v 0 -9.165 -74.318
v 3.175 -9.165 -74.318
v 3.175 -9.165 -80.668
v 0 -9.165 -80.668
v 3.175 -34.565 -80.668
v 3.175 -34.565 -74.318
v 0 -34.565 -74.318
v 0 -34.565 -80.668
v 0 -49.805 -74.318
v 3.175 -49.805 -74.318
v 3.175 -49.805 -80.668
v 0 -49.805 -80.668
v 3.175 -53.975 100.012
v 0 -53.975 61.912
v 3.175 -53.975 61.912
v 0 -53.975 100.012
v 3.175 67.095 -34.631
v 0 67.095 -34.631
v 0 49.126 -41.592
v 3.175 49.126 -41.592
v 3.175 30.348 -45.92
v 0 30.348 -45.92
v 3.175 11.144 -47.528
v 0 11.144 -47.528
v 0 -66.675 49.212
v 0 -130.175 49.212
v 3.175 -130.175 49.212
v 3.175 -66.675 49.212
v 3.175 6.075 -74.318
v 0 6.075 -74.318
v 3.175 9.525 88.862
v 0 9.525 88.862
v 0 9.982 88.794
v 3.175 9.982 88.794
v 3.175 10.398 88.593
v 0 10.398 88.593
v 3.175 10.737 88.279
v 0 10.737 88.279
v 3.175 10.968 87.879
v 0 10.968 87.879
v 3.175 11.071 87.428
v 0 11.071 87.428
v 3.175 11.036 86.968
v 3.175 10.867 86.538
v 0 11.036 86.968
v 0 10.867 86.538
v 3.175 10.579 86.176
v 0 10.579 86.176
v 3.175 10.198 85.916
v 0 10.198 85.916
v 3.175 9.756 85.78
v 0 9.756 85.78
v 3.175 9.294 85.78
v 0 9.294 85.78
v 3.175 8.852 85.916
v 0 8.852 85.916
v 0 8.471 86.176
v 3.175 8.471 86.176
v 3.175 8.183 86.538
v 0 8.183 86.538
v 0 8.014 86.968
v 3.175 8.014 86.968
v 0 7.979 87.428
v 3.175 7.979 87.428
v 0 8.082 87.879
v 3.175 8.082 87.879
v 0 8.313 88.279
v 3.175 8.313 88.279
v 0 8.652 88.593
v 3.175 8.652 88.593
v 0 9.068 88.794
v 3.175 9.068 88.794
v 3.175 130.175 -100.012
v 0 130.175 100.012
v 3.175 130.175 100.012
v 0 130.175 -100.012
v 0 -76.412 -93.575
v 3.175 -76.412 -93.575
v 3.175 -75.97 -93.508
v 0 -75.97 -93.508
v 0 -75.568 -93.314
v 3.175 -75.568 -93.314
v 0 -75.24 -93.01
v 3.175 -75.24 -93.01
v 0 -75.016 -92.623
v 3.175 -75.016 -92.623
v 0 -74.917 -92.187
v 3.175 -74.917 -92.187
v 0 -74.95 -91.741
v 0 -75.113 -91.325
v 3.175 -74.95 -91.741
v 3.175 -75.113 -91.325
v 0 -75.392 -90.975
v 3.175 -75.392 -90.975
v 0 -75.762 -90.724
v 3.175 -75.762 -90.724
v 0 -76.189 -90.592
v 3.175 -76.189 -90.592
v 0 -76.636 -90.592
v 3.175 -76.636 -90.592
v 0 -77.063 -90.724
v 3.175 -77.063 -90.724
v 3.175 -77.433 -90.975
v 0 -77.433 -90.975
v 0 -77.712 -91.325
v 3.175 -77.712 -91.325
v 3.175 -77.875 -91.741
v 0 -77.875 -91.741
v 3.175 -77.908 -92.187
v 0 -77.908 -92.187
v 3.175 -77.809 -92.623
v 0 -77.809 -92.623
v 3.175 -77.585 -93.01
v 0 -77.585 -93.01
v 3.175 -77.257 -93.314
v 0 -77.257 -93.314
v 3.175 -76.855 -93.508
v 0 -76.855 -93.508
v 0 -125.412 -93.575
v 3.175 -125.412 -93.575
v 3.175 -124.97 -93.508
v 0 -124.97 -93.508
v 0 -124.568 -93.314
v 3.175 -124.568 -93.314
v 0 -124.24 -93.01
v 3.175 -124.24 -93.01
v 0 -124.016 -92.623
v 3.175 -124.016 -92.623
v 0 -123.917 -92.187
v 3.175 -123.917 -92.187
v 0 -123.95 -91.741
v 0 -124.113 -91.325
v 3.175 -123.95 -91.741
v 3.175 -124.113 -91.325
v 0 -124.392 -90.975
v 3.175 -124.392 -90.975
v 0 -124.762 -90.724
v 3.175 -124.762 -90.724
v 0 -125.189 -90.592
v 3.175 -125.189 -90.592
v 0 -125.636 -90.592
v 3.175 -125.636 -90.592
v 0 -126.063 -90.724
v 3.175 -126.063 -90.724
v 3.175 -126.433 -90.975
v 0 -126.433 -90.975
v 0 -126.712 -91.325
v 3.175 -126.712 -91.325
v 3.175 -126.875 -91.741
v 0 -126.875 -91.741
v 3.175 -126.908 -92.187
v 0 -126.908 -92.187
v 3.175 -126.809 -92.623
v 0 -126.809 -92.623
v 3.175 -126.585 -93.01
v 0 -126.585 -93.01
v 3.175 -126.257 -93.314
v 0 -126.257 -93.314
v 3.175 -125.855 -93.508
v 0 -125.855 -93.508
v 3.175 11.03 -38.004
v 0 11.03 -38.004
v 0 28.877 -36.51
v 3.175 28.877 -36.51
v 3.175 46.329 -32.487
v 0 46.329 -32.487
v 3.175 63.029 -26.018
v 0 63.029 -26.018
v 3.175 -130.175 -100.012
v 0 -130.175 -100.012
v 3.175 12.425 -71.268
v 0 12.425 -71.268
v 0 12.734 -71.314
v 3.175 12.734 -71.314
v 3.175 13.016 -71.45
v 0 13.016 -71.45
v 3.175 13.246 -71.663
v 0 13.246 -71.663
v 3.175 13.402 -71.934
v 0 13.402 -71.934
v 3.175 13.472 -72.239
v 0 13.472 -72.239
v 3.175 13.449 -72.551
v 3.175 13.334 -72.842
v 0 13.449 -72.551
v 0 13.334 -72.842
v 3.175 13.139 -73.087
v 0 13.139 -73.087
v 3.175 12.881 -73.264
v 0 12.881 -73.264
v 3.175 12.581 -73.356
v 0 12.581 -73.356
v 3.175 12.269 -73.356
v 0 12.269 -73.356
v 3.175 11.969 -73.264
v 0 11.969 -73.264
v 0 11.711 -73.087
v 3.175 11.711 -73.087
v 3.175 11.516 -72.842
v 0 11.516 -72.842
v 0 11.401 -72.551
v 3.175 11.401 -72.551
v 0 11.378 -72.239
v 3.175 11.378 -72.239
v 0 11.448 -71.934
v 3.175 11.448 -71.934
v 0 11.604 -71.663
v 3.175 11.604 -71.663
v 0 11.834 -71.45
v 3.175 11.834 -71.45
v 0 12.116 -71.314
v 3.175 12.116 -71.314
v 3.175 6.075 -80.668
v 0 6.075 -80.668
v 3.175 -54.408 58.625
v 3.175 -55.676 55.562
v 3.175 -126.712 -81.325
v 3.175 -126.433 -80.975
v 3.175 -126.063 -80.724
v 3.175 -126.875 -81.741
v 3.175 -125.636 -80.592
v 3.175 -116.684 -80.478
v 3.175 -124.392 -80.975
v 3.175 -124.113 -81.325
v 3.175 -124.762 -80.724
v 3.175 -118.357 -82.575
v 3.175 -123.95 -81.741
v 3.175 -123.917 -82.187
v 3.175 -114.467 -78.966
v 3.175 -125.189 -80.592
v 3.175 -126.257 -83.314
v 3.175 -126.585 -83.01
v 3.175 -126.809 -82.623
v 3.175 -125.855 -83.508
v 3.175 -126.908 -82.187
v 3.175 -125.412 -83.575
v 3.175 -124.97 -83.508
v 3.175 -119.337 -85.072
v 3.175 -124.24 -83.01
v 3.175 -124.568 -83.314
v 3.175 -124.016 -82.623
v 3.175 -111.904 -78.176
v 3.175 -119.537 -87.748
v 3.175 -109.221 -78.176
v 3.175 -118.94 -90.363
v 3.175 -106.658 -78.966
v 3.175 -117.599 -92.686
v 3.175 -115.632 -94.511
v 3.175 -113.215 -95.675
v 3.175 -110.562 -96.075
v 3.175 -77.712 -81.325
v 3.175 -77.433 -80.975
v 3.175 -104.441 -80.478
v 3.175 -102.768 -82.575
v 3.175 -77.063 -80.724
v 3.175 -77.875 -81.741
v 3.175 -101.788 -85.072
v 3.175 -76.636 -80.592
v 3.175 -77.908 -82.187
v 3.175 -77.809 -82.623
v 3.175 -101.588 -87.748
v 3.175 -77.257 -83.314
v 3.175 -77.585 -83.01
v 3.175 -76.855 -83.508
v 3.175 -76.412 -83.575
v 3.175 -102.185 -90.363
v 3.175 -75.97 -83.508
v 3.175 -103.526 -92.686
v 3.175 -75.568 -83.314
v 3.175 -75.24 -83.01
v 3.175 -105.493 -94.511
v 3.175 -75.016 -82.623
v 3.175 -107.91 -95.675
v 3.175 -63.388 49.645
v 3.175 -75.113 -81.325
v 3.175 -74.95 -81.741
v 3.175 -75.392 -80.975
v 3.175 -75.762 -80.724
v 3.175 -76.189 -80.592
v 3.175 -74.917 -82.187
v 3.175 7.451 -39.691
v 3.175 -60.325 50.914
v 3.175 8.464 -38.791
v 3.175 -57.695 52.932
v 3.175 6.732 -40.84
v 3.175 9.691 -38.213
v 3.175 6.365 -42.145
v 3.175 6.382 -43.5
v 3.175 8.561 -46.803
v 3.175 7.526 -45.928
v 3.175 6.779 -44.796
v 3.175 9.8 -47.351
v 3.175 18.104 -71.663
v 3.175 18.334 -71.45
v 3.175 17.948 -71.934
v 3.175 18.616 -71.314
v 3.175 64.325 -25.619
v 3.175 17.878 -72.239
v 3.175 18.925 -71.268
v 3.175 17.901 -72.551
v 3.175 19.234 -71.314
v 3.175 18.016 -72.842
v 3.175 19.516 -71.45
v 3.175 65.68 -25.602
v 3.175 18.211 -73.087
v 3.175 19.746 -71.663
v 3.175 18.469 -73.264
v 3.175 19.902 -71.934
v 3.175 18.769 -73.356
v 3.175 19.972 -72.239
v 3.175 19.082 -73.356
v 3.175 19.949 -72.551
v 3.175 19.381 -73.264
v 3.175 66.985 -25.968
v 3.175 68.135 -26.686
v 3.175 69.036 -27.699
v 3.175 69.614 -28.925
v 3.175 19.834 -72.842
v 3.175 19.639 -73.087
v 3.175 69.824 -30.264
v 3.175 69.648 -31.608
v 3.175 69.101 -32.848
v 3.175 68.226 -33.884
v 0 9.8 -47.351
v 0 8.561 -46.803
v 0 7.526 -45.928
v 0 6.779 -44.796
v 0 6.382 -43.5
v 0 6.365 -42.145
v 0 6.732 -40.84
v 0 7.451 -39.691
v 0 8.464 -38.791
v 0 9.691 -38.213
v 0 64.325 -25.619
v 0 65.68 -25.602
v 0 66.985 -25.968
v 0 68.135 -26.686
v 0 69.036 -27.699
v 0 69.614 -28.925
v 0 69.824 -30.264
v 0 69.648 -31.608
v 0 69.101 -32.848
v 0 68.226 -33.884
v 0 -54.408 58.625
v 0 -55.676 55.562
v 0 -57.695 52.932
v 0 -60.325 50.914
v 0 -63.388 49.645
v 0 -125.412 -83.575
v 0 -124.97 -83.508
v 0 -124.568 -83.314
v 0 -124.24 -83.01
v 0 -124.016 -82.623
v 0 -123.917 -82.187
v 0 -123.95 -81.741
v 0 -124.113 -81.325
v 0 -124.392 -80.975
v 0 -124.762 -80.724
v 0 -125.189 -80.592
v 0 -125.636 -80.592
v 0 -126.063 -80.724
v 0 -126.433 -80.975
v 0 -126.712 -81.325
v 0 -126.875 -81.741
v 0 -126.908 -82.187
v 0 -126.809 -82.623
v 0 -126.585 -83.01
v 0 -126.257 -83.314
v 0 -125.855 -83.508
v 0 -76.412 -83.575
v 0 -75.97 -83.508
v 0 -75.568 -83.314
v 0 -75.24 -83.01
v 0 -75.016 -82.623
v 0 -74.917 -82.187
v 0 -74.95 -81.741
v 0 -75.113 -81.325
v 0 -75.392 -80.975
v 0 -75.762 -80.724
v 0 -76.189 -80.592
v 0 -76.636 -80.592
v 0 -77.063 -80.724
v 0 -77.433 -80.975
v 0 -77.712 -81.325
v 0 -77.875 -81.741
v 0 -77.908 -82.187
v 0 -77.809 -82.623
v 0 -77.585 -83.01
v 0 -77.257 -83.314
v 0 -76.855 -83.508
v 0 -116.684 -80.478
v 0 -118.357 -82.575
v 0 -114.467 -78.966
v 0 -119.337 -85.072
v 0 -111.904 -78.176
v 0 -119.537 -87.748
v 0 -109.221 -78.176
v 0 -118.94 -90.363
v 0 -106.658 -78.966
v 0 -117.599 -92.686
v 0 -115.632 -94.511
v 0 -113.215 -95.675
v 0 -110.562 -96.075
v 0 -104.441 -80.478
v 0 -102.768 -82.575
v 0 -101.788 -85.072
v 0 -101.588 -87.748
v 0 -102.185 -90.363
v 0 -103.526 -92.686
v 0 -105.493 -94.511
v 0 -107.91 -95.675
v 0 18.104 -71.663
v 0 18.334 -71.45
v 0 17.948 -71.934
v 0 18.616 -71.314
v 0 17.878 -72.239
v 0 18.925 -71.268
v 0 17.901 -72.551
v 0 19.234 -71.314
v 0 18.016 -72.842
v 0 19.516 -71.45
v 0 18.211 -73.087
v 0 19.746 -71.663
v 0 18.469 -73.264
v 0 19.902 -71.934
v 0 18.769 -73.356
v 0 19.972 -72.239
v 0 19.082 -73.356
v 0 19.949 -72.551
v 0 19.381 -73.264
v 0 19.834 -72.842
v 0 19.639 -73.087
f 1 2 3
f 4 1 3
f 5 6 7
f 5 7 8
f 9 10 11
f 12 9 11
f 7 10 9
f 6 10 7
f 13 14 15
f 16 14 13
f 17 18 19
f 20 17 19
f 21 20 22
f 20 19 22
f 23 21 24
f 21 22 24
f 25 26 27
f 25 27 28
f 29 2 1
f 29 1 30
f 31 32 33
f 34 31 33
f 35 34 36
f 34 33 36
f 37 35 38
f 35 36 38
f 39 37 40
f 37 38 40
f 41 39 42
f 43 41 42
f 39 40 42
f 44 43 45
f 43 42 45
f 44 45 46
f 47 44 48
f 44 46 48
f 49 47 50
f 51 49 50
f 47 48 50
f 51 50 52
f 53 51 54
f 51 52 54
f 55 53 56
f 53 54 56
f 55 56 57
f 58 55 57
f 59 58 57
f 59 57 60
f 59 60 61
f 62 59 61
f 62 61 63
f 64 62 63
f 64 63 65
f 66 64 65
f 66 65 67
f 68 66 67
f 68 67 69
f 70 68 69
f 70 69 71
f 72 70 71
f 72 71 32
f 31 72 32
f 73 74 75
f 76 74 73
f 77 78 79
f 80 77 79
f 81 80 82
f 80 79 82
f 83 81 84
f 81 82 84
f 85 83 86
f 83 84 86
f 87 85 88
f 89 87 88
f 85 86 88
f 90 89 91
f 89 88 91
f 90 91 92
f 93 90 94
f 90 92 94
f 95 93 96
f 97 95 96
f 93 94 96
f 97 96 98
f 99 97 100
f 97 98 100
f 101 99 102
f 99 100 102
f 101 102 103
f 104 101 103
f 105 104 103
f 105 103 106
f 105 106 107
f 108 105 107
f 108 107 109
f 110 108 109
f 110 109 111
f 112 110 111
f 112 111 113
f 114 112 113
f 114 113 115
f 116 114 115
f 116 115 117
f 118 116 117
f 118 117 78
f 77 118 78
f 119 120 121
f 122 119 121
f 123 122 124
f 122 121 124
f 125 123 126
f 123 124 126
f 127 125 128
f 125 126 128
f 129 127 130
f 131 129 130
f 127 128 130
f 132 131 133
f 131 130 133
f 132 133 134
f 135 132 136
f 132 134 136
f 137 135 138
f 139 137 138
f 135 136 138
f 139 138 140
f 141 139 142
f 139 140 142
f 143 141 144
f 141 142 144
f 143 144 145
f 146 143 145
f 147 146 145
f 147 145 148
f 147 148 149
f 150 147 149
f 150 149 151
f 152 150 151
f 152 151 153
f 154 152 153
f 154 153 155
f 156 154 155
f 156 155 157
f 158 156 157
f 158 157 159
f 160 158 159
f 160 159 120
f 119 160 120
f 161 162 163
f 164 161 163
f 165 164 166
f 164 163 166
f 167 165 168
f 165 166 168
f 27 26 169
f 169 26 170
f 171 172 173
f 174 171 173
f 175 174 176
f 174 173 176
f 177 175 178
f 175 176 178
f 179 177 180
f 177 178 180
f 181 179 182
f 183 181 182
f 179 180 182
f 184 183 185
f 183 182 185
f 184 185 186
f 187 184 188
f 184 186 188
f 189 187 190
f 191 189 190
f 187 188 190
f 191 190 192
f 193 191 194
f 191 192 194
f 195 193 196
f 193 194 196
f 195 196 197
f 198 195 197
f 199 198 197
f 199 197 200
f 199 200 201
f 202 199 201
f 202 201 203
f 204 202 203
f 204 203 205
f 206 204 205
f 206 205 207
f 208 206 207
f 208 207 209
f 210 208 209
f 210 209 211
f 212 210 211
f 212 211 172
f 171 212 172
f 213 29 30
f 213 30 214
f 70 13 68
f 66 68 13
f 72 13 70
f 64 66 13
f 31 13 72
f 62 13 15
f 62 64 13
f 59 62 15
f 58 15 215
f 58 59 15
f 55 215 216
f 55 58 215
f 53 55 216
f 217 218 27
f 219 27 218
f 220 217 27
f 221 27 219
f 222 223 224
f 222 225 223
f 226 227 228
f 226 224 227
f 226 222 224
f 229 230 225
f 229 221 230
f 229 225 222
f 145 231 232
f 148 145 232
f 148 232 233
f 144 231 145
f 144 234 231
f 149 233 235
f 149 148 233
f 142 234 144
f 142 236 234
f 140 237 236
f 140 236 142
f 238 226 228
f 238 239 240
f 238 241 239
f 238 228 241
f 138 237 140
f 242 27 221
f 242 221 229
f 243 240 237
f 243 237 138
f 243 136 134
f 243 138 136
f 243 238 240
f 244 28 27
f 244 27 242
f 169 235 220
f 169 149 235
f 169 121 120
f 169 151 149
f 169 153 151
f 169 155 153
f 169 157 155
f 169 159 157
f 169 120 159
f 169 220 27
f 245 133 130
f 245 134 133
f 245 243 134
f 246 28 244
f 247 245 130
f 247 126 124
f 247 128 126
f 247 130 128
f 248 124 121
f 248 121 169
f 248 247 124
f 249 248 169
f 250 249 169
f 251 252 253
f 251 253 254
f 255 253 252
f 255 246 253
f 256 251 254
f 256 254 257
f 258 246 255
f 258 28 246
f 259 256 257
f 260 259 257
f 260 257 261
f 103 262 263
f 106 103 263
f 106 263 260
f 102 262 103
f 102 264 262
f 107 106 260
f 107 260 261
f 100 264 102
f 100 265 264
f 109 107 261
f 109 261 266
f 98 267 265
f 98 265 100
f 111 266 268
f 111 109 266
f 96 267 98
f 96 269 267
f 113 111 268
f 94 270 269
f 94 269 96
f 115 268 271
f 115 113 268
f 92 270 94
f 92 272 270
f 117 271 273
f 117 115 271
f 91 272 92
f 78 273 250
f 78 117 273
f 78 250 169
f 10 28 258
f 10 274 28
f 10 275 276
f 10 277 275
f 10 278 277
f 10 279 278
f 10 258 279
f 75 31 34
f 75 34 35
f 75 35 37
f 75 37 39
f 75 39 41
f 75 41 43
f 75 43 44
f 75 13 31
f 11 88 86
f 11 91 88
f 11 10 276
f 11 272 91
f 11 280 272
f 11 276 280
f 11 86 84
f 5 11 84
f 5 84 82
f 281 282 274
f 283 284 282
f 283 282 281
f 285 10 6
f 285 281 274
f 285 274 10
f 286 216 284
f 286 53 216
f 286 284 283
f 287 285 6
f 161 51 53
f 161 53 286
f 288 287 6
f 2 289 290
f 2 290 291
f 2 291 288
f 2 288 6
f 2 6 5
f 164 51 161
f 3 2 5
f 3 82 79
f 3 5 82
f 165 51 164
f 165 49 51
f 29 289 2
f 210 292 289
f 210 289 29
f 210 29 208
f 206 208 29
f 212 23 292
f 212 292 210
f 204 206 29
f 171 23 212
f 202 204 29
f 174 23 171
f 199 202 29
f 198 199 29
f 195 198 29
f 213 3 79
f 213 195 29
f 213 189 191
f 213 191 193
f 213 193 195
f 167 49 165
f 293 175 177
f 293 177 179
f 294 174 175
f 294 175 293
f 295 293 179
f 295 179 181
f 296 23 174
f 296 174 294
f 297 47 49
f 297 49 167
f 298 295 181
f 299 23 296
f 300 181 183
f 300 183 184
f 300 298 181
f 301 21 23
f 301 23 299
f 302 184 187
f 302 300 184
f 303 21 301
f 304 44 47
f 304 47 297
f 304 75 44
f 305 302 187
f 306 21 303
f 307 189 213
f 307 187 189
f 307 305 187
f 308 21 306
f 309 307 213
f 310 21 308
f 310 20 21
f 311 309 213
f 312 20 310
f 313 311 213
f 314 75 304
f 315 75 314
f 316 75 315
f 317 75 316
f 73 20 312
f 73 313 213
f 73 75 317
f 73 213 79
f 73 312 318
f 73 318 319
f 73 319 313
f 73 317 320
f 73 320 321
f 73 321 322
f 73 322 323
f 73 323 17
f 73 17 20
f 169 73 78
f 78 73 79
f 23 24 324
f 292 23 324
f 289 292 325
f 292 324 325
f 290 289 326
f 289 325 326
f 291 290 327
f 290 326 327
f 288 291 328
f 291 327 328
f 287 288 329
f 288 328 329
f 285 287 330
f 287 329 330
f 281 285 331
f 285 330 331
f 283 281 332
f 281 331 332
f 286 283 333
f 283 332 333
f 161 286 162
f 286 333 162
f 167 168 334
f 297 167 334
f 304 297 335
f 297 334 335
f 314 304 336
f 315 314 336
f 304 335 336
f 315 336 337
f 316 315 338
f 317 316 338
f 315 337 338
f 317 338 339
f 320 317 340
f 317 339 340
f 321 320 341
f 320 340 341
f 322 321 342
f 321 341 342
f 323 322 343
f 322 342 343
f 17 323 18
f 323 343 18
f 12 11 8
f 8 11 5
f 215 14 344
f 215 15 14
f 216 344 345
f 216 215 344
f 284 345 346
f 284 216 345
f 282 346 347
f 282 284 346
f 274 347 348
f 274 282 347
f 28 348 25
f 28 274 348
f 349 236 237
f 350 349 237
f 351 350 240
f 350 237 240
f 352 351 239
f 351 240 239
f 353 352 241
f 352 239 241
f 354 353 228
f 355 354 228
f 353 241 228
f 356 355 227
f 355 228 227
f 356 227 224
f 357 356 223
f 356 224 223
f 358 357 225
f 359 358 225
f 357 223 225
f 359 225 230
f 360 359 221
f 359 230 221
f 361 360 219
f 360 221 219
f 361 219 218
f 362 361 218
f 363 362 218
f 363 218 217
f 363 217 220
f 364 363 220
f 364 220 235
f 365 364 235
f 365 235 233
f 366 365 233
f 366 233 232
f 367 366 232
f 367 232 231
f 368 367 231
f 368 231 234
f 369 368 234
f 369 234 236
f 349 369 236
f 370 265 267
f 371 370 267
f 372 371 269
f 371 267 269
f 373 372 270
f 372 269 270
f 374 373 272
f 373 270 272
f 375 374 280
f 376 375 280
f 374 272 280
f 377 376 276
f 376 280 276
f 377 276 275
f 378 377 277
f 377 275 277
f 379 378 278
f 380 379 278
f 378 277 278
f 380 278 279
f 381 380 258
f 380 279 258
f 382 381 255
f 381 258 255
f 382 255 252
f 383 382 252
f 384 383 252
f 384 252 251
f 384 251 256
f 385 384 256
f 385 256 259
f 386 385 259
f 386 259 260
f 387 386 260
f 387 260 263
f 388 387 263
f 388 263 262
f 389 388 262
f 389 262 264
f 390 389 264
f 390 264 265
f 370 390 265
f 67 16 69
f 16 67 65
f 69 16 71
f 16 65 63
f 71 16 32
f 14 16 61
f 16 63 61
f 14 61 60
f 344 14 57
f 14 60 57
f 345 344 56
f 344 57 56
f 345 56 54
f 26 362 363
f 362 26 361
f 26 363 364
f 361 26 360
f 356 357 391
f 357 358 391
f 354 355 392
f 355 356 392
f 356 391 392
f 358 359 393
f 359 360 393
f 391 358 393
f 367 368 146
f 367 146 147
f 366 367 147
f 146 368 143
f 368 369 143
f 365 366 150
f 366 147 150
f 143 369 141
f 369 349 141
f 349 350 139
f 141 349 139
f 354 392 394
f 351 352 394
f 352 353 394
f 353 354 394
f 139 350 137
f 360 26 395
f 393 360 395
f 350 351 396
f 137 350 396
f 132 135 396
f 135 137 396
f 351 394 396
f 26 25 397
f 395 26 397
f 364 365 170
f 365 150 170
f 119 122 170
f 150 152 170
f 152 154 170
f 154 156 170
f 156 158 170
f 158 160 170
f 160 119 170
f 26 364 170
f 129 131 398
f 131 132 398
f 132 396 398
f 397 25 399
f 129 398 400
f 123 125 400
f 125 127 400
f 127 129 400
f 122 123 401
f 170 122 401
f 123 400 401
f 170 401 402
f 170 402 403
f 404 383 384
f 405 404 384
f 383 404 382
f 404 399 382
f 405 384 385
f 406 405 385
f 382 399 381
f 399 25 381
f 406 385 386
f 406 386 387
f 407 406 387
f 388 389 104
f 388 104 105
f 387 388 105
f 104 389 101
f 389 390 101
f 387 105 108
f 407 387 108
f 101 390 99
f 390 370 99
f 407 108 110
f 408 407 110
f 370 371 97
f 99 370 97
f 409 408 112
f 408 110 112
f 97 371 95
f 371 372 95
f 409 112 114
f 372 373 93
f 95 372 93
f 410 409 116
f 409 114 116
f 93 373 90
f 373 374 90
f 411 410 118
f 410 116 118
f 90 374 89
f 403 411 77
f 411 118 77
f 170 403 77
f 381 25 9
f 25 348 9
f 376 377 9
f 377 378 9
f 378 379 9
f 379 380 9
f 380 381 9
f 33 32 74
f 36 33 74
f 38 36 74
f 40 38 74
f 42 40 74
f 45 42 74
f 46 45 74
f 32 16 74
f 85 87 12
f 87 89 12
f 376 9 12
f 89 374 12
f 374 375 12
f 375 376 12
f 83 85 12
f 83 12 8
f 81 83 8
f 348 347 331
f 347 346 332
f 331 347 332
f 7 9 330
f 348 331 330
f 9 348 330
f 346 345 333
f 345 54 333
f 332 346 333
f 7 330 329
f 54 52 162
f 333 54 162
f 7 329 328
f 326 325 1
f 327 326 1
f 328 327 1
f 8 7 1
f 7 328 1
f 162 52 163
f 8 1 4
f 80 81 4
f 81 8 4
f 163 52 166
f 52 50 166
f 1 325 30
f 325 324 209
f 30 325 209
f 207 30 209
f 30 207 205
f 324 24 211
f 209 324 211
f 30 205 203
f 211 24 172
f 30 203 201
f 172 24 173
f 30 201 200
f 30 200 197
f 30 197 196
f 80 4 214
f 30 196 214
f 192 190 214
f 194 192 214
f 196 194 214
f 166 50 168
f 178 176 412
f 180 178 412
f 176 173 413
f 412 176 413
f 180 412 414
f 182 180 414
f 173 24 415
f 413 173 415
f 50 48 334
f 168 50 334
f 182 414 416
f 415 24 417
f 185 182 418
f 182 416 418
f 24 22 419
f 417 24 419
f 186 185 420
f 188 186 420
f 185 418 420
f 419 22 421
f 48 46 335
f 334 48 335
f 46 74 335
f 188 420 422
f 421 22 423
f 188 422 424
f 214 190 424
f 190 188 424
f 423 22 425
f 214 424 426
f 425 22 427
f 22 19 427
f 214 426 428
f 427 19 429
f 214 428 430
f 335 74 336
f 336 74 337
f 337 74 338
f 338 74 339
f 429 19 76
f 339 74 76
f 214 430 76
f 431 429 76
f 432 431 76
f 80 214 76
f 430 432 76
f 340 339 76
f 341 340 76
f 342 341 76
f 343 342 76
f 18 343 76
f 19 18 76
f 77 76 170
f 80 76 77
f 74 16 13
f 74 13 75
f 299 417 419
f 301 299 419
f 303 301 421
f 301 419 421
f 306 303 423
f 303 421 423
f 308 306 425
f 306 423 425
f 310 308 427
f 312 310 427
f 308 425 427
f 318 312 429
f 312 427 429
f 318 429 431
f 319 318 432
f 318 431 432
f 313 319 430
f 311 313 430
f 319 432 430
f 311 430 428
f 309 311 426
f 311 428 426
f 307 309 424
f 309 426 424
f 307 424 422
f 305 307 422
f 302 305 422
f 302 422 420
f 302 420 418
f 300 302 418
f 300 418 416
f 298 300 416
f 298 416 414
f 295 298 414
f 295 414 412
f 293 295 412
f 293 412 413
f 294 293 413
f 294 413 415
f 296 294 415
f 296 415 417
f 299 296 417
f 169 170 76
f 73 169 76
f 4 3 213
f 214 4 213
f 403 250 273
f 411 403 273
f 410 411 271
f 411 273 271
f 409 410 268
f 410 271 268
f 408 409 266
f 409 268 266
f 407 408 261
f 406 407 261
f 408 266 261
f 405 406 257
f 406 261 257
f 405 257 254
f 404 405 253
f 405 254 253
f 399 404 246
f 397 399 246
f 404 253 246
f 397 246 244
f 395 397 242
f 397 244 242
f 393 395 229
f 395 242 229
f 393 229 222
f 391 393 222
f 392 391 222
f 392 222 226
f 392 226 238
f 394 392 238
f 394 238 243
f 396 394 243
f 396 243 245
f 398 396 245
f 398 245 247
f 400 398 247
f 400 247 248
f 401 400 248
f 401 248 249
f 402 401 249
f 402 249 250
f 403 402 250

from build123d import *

# Parameters (mm, degrees)
SKETCH1_W           = 200.025
SKETCH1_H           = 260.35
BOSS_EXTRUDE1_DEPTH = 3.175
SKETCH8_R           = 1.55
SKETCH8_R_2         = 1.0499979
CUT_EXTRUDE7_DEPTH  = 4.175
SKETCH9_W           = 50.8
SKETCH9_H           = 76.2
CUT_EXTRUDE8_DEPTH  = 4.175
FILLET1_R           = 12.7
CUT_EXTRUDE9_DEPTH  = 4.175
SKETCH15_W          = 6.35
SKETCH15_H          = 15.24
CUT_EXTRUDE12_DEPTH = 4.175
SKETCH16_R          = 1.5
SKETCH16_R_2        = 9
CUT_EXTRUDE13_DEPTH = 4.175


with BuildPart() as part:
    # Sketch1 → Boss-Extrude1 (new body)
    with BuildSketch(Plane(origin=(0, 0, 0), x_dir=(0, 0, -1), z_dir=(1, 0, 0))):
        Rectangle(SKETCH1_W, SKETCH1_H)
    extrude(amount=BOSS_EXTRUDE1_DEPTH)

    # Sketch8 → Cut-Extrude7 (cut, through all)
    with BuildSketch(Plane.ZY):
        with Locations((87.3125, 9.525)):
            Circle(SKETCH8_R)
        with Locations((-72.3175, 18.9250066)):
            Circle(SKETCH8_R_2)
        with Locations((-72.3175, 12.4249942)):
            Circle(SKETCH8_R_2)
    extrude(amount=-CUT_EXTRUDE7_DEPTH, mode=Mode.SUBTRACT)

    # Sketch9 → Cut-Extrude8 (cut, through all)
    with BuildSketch(Plane.ZY):
        with Locations((74.6125, -92.075)):
            Rectangle(SKETCH9_W, SKETCH9_H)
    extrude(amount=-CUT_EXTRUDE8_DEPTH, mode=Mode.SUBTRACT)

    # Fillet1
    fillet1_edges = [part.edges().sort_by_distance(p)[0] for p in [
        (1.5875, -53.975, 49.2125),
    ]]
    fillet(fillet1_edges, radius=FILLET1_R)

    # Sketch10 → Cut-Extrude9 (cut, through all)
    with BuildSketch(Plane.ZY):
        with BuildLine():
            ThreePointArc((-34.631218673, 67.095364965), (-44.09213985, 39.8142402), (-47.528128749, 11.144346963))
            ThreePointArc((-47.528128749, 11.144346963), (-42.823162504, 6.325000001), (-38.003815542, 11.029966247))
            ThreePointArc((-38.003815542, 11.029966247), (-34.810523806, 37.674794334), (-26.017864022, 63.028948034))
            ThreePointArc((-26.017864022, 63.028948034), (-28.291332832, 69.36883393), (-34.631218673, 67.095364965))
        make_face()
    extrude(amount=-CUT_EXTRUDE9_DEPTH, mode=Mode.SUBTRACT)

    # Sketch15 → Cut-Extrude12 (cut, through all)
    with BuildSketch(Plane(origin=(3.175, 0, 0), x_dir=(0, 0, -1), z_dir=(1, 0, 0))):
        with Locations((77.4925, -1.5450058)):
            Rectangle(SKETCH15_W, SKETCH15_H)
        with Locations((77.4925, -42.1850058)):
            Rectangle(SKETCH15_W, SKETCH15_H)
    extrude(amount=-CUT_EXTRUDE12_DEPTH, mode=Mode.SUBTRACT)

    # Sketch16 → Cut-Extrude13 (cut, through all)
    with BuildSketch(Plane(origin=(3.175, 0, 0), x_dir=(0, 0, -1), z_dir=(1, 0, 0))):
        with Locations((82.075, -125.4125)):
            Circle(SKETCH16_R)
        with Locations((82.075, -76.4125)):
            Circle(SKETCH16_R)
        with Locations((92.075, -125.4125)):
            Circle(SKETCH16_R)
        with Locations((92.075, -76.4125)):
            Circle(SKETCH16_R)
        with Locations((87.075, -110.5624916)):
            Circle(SKETCH16_R_2)
    extrude(amount=-CUT_EXTRUDE13_DEPTH, mode=Mode.SUBTRACT)


solid = part.part
